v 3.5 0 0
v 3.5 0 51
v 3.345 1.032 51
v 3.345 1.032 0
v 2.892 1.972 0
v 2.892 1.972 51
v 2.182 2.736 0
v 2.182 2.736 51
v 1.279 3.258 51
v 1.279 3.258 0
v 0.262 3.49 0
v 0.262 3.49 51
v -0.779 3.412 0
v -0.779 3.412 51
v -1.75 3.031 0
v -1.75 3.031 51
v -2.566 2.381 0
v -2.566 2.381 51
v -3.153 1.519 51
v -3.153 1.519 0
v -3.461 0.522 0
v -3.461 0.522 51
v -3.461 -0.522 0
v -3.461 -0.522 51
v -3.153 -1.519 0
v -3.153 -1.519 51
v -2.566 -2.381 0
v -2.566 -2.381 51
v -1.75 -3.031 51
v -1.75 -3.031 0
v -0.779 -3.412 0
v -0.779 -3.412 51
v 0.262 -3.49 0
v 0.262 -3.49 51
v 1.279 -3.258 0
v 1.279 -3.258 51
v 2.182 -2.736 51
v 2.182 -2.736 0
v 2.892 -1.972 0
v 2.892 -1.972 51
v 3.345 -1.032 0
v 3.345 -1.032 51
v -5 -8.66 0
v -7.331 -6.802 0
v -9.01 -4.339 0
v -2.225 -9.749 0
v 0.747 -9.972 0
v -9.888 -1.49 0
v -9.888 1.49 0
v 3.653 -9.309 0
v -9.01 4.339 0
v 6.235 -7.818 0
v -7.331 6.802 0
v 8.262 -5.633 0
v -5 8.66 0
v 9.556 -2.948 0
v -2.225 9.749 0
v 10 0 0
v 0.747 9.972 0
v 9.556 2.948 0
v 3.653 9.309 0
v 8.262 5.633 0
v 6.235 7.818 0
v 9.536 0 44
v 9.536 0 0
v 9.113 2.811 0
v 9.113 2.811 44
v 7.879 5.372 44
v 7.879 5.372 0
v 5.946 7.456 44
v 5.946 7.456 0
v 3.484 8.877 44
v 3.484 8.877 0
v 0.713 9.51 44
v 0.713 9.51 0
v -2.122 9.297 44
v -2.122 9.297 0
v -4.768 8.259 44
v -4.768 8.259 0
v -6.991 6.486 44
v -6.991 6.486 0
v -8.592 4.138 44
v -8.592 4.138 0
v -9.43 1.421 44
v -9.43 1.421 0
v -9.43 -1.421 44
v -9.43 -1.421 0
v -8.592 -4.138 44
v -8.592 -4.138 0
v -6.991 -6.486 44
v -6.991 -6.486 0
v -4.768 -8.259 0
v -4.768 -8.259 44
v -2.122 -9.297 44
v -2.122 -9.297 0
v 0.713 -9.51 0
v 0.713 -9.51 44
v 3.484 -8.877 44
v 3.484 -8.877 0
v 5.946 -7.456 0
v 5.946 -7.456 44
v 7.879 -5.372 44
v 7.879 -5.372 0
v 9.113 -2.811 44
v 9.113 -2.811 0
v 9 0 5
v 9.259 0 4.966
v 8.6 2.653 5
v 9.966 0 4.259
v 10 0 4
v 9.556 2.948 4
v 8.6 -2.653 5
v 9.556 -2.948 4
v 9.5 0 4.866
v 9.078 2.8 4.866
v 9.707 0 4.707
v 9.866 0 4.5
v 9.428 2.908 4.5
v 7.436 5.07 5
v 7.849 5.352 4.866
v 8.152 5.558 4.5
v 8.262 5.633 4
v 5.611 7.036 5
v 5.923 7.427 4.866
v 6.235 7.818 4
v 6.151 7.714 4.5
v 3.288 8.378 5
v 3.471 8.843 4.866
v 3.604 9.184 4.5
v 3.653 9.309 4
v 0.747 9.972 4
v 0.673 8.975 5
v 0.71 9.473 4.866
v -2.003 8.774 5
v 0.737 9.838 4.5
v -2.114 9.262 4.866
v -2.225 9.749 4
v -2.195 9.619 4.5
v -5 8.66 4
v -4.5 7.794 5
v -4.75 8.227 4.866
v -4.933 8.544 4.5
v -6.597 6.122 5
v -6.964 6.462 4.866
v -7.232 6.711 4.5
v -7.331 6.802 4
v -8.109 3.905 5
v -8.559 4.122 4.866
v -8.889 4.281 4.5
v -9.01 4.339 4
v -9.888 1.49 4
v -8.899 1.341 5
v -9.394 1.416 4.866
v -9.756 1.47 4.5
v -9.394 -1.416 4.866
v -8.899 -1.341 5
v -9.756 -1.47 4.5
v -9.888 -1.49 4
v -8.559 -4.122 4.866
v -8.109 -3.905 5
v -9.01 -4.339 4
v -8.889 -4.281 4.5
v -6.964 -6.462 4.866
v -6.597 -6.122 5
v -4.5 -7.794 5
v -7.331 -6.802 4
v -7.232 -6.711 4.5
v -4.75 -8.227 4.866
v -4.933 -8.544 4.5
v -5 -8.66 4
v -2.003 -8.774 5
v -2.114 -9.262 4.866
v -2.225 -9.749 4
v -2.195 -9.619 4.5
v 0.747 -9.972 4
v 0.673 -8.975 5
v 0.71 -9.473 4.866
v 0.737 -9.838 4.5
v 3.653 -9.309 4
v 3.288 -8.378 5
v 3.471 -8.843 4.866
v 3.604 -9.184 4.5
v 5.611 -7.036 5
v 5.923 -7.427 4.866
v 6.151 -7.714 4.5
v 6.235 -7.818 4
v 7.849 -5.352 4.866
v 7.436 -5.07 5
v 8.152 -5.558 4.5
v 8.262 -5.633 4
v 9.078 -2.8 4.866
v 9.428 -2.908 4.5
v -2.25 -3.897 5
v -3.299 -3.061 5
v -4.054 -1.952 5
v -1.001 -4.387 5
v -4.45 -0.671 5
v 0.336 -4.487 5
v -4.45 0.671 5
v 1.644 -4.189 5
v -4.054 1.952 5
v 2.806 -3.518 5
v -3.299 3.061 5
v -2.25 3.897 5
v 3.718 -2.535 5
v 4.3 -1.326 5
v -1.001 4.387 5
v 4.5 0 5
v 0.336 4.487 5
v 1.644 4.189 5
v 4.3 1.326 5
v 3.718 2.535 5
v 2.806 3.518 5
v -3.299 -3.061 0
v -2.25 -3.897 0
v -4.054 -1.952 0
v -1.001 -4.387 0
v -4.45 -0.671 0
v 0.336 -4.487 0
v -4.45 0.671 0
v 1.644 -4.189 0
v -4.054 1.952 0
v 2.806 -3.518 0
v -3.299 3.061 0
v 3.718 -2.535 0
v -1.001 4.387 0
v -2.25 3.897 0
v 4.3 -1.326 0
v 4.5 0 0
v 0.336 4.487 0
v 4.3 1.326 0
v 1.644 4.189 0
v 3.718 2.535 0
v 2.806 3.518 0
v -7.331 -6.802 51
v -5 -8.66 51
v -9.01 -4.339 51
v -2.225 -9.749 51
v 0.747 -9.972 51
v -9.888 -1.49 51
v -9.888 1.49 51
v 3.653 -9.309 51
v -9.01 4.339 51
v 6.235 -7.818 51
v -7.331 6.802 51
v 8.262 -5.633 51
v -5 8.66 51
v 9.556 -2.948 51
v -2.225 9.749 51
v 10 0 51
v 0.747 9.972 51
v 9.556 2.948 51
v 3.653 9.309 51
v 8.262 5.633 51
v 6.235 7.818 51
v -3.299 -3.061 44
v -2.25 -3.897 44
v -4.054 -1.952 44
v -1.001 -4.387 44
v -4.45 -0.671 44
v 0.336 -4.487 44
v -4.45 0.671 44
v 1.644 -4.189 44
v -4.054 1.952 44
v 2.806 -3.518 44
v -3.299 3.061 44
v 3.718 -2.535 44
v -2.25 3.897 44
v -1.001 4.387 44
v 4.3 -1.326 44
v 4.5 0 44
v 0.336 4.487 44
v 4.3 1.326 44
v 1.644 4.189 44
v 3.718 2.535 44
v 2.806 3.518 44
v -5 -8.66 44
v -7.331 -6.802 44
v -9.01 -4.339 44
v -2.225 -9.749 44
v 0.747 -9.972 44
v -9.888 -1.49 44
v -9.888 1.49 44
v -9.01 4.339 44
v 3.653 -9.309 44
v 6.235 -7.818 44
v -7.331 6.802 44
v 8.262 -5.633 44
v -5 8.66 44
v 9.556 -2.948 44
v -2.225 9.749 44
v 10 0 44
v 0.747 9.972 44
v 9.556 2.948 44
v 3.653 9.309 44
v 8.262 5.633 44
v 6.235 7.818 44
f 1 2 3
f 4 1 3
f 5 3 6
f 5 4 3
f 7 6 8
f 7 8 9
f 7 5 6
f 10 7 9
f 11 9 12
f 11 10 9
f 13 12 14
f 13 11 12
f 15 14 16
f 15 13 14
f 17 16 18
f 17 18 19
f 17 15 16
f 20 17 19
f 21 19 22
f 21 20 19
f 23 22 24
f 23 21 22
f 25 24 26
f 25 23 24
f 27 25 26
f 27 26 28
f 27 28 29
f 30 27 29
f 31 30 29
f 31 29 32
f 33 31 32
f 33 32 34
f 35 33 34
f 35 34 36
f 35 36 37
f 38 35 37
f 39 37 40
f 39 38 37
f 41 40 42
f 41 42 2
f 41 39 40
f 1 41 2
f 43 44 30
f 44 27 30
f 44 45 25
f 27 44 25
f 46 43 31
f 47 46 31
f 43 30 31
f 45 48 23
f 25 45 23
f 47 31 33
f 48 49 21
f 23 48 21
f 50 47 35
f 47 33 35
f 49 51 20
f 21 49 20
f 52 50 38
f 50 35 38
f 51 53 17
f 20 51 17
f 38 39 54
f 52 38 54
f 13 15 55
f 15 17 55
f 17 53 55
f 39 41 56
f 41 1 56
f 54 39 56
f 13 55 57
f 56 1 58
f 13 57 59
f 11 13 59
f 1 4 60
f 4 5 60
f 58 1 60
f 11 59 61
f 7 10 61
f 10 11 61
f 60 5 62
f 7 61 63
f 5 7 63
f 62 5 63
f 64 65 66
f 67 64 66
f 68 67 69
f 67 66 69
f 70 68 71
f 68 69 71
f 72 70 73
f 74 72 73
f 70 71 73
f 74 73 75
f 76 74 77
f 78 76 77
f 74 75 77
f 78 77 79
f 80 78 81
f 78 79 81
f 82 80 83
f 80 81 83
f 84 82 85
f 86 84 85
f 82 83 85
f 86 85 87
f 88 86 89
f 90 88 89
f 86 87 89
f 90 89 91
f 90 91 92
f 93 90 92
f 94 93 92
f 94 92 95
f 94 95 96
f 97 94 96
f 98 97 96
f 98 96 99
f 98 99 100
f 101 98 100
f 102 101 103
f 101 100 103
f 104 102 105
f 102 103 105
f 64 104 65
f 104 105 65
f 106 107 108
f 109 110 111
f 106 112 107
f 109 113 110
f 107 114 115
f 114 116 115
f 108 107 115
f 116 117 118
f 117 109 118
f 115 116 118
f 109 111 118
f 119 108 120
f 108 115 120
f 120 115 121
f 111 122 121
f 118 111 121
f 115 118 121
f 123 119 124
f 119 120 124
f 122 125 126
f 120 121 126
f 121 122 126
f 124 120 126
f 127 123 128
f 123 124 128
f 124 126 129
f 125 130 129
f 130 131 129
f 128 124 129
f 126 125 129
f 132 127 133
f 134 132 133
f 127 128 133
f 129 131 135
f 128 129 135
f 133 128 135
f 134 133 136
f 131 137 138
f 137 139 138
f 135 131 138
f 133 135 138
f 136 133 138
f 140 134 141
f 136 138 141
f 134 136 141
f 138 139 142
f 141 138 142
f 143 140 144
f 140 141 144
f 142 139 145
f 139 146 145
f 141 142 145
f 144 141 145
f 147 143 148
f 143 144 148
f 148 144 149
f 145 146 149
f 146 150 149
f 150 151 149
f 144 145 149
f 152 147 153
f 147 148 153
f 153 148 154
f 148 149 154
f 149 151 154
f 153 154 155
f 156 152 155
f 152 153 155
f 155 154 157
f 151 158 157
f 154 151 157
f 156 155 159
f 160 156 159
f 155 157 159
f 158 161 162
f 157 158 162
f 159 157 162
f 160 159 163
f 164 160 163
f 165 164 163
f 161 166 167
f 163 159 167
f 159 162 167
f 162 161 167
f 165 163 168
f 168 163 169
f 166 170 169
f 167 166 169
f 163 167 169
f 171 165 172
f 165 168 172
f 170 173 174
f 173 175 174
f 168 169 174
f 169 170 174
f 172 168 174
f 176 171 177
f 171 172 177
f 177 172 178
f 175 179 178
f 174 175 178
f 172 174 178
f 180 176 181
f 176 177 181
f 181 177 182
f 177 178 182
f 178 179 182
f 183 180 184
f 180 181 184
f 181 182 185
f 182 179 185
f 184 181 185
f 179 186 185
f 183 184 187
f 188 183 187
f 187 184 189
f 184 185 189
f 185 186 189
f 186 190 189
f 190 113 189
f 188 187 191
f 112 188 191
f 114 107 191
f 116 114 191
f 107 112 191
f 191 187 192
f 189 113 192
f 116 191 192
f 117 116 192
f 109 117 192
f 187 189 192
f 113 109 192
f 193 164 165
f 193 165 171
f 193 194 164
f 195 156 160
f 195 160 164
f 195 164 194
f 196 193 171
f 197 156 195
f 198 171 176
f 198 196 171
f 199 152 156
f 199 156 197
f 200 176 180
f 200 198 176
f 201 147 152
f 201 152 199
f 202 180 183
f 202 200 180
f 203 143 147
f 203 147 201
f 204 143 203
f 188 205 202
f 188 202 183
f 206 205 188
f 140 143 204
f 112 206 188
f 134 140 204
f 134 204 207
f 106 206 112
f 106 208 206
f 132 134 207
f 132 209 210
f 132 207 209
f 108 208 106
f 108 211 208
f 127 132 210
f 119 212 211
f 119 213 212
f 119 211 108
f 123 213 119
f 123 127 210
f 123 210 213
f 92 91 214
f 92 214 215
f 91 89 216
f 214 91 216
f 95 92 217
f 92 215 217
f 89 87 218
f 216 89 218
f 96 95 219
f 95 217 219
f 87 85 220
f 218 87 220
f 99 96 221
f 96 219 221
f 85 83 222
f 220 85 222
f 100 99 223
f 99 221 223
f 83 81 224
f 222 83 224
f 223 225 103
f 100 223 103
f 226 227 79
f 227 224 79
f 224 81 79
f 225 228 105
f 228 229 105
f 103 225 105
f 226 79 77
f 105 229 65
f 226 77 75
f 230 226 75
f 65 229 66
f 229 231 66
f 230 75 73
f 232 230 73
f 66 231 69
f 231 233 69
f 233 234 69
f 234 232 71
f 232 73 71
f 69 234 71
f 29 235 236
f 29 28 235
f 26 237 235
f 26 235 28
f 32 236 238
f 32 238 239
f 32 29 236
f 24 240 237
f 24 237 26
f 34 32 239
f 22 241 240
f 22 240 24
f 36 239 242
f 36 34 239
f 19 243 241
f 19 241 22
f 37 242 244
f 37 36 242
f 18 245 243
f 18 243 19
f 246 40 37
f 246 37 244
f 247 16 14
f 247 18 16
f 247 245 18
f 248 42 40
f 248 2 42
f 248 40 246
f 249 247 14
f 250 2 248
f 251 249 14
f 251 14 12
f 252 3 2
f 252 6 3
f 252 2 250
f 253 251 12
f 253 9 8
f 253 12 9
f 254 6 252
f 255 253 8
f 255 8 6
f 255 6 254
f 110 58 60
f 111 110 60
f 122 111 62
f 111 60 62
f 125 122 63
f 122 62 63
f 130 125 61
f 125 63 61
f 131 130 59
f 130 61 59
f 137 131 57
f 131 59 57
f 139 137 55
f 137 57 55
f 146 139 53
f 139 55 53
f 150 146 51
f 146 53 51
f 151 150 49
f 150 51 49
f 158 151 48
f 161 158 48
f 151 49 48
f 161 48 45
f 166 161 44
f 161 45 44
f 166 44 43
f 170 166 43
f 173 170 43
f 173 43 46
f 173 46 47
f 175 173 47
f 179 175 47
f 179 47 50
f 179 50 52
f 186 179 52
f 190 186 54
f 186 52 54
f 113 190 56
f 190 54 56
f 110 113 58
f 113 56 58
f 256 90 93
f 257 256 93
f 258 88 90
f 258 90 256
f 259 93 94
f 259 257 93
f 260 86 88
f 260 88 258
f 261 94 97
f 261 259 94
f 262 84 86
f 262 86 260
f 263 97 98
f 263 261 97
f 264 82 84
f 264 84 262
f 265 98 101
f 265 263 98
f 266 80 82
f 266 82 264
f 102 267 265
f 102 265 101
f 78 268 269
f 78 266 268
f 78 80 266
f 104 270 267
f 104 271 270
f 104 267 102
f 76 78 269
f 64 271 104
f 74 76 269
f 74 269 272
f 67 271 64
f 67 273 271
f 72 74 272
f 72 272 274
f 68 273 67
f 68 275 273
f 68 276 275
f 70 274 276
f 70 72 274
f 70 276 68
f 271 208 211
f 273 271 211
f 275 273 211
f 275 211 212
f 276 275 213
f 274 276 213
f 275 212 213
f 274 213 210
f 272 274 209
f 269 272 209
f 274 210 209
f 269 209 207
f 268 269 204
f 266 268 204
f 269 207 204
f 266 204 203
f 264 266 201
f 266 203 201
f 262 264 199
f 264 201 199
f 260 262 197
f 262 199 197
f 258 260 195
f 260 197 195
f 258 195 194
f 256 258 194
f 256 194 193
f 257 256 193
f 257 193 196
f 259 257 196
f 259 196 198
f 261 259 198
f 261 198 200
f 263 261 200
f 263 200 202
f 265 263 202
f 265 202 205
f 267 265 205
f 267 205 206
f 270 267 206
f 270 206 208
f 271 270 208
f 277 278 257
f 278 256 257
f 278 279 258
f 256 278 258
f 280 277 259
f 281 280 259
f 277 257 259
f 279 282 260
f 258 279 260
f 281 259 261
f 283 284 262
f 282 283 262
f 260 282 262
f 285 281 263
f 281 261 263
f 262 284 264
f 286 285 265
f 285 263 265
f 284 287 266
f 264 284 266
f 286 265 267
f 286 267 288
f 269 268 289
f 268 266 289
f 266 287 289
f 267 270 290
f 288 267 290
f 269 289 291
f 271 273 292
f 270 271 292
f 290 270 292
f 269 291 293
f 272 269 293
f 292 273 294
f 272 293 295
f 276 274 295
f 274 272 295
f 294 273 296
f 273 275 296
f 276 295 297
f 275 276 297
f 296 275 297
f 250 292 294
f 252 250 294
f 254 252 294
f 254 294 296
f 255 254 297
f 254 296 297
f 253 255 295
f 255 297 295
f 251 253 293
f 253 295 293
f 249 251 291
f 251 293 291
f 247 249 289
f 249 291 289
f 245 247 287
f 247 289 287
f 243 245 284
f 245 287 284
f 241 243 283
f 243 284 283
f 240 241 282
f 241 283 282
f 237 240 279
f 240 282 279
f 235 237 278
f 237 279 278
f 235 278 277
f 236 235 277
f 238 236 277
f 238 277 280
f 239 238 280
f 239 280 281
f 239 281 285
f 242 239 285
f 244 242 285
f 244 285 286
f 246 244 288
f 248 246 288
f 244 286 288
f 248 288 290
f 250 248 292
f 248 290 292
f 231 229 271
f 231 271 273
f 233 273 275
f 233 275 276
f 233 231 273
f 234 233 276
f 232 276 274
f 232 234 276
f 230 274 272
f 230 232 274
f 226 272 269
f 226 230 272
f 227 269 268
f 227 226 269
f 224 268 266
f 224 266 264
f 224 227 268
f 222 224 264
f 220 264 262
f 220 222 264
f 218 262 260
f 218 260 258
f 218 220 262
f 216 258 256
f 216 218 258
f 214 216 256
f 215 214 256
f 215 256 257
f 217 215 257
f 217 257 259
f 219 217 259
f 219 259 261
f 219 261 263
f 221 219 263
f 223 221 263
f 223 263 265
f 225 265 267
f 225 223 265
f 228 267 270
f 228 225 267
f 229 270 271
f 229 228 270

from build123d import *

# Parameters (mm, degrees)
F0_R     = 10
F0_R_2   = 9.5362250702
F0_R_3   = 4.5
F1_DEPTH = 5
F2_DEPTH = 44
F0_R_4   = 3.5
F3_DEPTH = 51
F4_R     = 10
F4_R_2   = 9.5362250702
F4_R_3   = 4.5
F5_DEPTH = 7
F6_R     = 1


with BuildPart() as f1:
    # F0 (on Top) → F1 (new body)
    with BuildSketch(Plane.XY):
        Circle(F0_R)
        Circle(F0_R_2, mode=Mode.SUBTRACT)
        Circle(F0_R_2)
        Circle(F0_R_3, mode=Mode.SUBTRACT)
    extrude(amount=F1_DEPTH)

    # F0 (on Top) → F3 (join)
    with BuildSketch(Plane.XY):
        Circle(F0_R_3)
        Circle(F0_R_4, mode=Mode.SUBTRACT)
    extrude(amount=F3_DEPTH)

    # F4 (on face) → F5 (join, through all)
    with BuildSketch(Plane.XY.offset(44)):
        Circle(F4_R)
        Circle(F4_R_2, mode=Mode.SUBTRACT)
        Circle(F4_R_2)
        Circle(F4_R_3, mode=Mode.SUBTRACT)
    extrude(amount=F5_DEPTH)

    # F6
    f6_edges = [f1.edges().sort_by_distance(p)[0] for p in [
        (-10, 0, 5),
    ]]
    fillet(f6_edges, radius=F6_R)


with BuildPart() as f2:
    # F0 (on Top) → F2 (new body)
    with BuildSketch(Plane.XY):
        Circle(F0_R_2)
        Circle(F0_R_3, mode=Mode.SUBTRACT)
    extrude(amount=F2_DEPTH)


solid = Compound([f1.part, f2.part])
